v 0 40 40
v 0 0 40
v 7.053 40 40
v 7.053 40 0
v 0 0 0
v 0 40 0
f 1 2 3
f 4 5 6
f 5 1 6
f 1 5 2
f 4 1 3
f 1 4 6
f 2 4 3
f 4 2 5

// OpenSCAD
difference() {
	cube([40, 40, 40]);
	translate([0, 0, -1]) {
		rotate([0, 0, -10]) {
			cube([400, 400, 400]);
		}
	}
}
